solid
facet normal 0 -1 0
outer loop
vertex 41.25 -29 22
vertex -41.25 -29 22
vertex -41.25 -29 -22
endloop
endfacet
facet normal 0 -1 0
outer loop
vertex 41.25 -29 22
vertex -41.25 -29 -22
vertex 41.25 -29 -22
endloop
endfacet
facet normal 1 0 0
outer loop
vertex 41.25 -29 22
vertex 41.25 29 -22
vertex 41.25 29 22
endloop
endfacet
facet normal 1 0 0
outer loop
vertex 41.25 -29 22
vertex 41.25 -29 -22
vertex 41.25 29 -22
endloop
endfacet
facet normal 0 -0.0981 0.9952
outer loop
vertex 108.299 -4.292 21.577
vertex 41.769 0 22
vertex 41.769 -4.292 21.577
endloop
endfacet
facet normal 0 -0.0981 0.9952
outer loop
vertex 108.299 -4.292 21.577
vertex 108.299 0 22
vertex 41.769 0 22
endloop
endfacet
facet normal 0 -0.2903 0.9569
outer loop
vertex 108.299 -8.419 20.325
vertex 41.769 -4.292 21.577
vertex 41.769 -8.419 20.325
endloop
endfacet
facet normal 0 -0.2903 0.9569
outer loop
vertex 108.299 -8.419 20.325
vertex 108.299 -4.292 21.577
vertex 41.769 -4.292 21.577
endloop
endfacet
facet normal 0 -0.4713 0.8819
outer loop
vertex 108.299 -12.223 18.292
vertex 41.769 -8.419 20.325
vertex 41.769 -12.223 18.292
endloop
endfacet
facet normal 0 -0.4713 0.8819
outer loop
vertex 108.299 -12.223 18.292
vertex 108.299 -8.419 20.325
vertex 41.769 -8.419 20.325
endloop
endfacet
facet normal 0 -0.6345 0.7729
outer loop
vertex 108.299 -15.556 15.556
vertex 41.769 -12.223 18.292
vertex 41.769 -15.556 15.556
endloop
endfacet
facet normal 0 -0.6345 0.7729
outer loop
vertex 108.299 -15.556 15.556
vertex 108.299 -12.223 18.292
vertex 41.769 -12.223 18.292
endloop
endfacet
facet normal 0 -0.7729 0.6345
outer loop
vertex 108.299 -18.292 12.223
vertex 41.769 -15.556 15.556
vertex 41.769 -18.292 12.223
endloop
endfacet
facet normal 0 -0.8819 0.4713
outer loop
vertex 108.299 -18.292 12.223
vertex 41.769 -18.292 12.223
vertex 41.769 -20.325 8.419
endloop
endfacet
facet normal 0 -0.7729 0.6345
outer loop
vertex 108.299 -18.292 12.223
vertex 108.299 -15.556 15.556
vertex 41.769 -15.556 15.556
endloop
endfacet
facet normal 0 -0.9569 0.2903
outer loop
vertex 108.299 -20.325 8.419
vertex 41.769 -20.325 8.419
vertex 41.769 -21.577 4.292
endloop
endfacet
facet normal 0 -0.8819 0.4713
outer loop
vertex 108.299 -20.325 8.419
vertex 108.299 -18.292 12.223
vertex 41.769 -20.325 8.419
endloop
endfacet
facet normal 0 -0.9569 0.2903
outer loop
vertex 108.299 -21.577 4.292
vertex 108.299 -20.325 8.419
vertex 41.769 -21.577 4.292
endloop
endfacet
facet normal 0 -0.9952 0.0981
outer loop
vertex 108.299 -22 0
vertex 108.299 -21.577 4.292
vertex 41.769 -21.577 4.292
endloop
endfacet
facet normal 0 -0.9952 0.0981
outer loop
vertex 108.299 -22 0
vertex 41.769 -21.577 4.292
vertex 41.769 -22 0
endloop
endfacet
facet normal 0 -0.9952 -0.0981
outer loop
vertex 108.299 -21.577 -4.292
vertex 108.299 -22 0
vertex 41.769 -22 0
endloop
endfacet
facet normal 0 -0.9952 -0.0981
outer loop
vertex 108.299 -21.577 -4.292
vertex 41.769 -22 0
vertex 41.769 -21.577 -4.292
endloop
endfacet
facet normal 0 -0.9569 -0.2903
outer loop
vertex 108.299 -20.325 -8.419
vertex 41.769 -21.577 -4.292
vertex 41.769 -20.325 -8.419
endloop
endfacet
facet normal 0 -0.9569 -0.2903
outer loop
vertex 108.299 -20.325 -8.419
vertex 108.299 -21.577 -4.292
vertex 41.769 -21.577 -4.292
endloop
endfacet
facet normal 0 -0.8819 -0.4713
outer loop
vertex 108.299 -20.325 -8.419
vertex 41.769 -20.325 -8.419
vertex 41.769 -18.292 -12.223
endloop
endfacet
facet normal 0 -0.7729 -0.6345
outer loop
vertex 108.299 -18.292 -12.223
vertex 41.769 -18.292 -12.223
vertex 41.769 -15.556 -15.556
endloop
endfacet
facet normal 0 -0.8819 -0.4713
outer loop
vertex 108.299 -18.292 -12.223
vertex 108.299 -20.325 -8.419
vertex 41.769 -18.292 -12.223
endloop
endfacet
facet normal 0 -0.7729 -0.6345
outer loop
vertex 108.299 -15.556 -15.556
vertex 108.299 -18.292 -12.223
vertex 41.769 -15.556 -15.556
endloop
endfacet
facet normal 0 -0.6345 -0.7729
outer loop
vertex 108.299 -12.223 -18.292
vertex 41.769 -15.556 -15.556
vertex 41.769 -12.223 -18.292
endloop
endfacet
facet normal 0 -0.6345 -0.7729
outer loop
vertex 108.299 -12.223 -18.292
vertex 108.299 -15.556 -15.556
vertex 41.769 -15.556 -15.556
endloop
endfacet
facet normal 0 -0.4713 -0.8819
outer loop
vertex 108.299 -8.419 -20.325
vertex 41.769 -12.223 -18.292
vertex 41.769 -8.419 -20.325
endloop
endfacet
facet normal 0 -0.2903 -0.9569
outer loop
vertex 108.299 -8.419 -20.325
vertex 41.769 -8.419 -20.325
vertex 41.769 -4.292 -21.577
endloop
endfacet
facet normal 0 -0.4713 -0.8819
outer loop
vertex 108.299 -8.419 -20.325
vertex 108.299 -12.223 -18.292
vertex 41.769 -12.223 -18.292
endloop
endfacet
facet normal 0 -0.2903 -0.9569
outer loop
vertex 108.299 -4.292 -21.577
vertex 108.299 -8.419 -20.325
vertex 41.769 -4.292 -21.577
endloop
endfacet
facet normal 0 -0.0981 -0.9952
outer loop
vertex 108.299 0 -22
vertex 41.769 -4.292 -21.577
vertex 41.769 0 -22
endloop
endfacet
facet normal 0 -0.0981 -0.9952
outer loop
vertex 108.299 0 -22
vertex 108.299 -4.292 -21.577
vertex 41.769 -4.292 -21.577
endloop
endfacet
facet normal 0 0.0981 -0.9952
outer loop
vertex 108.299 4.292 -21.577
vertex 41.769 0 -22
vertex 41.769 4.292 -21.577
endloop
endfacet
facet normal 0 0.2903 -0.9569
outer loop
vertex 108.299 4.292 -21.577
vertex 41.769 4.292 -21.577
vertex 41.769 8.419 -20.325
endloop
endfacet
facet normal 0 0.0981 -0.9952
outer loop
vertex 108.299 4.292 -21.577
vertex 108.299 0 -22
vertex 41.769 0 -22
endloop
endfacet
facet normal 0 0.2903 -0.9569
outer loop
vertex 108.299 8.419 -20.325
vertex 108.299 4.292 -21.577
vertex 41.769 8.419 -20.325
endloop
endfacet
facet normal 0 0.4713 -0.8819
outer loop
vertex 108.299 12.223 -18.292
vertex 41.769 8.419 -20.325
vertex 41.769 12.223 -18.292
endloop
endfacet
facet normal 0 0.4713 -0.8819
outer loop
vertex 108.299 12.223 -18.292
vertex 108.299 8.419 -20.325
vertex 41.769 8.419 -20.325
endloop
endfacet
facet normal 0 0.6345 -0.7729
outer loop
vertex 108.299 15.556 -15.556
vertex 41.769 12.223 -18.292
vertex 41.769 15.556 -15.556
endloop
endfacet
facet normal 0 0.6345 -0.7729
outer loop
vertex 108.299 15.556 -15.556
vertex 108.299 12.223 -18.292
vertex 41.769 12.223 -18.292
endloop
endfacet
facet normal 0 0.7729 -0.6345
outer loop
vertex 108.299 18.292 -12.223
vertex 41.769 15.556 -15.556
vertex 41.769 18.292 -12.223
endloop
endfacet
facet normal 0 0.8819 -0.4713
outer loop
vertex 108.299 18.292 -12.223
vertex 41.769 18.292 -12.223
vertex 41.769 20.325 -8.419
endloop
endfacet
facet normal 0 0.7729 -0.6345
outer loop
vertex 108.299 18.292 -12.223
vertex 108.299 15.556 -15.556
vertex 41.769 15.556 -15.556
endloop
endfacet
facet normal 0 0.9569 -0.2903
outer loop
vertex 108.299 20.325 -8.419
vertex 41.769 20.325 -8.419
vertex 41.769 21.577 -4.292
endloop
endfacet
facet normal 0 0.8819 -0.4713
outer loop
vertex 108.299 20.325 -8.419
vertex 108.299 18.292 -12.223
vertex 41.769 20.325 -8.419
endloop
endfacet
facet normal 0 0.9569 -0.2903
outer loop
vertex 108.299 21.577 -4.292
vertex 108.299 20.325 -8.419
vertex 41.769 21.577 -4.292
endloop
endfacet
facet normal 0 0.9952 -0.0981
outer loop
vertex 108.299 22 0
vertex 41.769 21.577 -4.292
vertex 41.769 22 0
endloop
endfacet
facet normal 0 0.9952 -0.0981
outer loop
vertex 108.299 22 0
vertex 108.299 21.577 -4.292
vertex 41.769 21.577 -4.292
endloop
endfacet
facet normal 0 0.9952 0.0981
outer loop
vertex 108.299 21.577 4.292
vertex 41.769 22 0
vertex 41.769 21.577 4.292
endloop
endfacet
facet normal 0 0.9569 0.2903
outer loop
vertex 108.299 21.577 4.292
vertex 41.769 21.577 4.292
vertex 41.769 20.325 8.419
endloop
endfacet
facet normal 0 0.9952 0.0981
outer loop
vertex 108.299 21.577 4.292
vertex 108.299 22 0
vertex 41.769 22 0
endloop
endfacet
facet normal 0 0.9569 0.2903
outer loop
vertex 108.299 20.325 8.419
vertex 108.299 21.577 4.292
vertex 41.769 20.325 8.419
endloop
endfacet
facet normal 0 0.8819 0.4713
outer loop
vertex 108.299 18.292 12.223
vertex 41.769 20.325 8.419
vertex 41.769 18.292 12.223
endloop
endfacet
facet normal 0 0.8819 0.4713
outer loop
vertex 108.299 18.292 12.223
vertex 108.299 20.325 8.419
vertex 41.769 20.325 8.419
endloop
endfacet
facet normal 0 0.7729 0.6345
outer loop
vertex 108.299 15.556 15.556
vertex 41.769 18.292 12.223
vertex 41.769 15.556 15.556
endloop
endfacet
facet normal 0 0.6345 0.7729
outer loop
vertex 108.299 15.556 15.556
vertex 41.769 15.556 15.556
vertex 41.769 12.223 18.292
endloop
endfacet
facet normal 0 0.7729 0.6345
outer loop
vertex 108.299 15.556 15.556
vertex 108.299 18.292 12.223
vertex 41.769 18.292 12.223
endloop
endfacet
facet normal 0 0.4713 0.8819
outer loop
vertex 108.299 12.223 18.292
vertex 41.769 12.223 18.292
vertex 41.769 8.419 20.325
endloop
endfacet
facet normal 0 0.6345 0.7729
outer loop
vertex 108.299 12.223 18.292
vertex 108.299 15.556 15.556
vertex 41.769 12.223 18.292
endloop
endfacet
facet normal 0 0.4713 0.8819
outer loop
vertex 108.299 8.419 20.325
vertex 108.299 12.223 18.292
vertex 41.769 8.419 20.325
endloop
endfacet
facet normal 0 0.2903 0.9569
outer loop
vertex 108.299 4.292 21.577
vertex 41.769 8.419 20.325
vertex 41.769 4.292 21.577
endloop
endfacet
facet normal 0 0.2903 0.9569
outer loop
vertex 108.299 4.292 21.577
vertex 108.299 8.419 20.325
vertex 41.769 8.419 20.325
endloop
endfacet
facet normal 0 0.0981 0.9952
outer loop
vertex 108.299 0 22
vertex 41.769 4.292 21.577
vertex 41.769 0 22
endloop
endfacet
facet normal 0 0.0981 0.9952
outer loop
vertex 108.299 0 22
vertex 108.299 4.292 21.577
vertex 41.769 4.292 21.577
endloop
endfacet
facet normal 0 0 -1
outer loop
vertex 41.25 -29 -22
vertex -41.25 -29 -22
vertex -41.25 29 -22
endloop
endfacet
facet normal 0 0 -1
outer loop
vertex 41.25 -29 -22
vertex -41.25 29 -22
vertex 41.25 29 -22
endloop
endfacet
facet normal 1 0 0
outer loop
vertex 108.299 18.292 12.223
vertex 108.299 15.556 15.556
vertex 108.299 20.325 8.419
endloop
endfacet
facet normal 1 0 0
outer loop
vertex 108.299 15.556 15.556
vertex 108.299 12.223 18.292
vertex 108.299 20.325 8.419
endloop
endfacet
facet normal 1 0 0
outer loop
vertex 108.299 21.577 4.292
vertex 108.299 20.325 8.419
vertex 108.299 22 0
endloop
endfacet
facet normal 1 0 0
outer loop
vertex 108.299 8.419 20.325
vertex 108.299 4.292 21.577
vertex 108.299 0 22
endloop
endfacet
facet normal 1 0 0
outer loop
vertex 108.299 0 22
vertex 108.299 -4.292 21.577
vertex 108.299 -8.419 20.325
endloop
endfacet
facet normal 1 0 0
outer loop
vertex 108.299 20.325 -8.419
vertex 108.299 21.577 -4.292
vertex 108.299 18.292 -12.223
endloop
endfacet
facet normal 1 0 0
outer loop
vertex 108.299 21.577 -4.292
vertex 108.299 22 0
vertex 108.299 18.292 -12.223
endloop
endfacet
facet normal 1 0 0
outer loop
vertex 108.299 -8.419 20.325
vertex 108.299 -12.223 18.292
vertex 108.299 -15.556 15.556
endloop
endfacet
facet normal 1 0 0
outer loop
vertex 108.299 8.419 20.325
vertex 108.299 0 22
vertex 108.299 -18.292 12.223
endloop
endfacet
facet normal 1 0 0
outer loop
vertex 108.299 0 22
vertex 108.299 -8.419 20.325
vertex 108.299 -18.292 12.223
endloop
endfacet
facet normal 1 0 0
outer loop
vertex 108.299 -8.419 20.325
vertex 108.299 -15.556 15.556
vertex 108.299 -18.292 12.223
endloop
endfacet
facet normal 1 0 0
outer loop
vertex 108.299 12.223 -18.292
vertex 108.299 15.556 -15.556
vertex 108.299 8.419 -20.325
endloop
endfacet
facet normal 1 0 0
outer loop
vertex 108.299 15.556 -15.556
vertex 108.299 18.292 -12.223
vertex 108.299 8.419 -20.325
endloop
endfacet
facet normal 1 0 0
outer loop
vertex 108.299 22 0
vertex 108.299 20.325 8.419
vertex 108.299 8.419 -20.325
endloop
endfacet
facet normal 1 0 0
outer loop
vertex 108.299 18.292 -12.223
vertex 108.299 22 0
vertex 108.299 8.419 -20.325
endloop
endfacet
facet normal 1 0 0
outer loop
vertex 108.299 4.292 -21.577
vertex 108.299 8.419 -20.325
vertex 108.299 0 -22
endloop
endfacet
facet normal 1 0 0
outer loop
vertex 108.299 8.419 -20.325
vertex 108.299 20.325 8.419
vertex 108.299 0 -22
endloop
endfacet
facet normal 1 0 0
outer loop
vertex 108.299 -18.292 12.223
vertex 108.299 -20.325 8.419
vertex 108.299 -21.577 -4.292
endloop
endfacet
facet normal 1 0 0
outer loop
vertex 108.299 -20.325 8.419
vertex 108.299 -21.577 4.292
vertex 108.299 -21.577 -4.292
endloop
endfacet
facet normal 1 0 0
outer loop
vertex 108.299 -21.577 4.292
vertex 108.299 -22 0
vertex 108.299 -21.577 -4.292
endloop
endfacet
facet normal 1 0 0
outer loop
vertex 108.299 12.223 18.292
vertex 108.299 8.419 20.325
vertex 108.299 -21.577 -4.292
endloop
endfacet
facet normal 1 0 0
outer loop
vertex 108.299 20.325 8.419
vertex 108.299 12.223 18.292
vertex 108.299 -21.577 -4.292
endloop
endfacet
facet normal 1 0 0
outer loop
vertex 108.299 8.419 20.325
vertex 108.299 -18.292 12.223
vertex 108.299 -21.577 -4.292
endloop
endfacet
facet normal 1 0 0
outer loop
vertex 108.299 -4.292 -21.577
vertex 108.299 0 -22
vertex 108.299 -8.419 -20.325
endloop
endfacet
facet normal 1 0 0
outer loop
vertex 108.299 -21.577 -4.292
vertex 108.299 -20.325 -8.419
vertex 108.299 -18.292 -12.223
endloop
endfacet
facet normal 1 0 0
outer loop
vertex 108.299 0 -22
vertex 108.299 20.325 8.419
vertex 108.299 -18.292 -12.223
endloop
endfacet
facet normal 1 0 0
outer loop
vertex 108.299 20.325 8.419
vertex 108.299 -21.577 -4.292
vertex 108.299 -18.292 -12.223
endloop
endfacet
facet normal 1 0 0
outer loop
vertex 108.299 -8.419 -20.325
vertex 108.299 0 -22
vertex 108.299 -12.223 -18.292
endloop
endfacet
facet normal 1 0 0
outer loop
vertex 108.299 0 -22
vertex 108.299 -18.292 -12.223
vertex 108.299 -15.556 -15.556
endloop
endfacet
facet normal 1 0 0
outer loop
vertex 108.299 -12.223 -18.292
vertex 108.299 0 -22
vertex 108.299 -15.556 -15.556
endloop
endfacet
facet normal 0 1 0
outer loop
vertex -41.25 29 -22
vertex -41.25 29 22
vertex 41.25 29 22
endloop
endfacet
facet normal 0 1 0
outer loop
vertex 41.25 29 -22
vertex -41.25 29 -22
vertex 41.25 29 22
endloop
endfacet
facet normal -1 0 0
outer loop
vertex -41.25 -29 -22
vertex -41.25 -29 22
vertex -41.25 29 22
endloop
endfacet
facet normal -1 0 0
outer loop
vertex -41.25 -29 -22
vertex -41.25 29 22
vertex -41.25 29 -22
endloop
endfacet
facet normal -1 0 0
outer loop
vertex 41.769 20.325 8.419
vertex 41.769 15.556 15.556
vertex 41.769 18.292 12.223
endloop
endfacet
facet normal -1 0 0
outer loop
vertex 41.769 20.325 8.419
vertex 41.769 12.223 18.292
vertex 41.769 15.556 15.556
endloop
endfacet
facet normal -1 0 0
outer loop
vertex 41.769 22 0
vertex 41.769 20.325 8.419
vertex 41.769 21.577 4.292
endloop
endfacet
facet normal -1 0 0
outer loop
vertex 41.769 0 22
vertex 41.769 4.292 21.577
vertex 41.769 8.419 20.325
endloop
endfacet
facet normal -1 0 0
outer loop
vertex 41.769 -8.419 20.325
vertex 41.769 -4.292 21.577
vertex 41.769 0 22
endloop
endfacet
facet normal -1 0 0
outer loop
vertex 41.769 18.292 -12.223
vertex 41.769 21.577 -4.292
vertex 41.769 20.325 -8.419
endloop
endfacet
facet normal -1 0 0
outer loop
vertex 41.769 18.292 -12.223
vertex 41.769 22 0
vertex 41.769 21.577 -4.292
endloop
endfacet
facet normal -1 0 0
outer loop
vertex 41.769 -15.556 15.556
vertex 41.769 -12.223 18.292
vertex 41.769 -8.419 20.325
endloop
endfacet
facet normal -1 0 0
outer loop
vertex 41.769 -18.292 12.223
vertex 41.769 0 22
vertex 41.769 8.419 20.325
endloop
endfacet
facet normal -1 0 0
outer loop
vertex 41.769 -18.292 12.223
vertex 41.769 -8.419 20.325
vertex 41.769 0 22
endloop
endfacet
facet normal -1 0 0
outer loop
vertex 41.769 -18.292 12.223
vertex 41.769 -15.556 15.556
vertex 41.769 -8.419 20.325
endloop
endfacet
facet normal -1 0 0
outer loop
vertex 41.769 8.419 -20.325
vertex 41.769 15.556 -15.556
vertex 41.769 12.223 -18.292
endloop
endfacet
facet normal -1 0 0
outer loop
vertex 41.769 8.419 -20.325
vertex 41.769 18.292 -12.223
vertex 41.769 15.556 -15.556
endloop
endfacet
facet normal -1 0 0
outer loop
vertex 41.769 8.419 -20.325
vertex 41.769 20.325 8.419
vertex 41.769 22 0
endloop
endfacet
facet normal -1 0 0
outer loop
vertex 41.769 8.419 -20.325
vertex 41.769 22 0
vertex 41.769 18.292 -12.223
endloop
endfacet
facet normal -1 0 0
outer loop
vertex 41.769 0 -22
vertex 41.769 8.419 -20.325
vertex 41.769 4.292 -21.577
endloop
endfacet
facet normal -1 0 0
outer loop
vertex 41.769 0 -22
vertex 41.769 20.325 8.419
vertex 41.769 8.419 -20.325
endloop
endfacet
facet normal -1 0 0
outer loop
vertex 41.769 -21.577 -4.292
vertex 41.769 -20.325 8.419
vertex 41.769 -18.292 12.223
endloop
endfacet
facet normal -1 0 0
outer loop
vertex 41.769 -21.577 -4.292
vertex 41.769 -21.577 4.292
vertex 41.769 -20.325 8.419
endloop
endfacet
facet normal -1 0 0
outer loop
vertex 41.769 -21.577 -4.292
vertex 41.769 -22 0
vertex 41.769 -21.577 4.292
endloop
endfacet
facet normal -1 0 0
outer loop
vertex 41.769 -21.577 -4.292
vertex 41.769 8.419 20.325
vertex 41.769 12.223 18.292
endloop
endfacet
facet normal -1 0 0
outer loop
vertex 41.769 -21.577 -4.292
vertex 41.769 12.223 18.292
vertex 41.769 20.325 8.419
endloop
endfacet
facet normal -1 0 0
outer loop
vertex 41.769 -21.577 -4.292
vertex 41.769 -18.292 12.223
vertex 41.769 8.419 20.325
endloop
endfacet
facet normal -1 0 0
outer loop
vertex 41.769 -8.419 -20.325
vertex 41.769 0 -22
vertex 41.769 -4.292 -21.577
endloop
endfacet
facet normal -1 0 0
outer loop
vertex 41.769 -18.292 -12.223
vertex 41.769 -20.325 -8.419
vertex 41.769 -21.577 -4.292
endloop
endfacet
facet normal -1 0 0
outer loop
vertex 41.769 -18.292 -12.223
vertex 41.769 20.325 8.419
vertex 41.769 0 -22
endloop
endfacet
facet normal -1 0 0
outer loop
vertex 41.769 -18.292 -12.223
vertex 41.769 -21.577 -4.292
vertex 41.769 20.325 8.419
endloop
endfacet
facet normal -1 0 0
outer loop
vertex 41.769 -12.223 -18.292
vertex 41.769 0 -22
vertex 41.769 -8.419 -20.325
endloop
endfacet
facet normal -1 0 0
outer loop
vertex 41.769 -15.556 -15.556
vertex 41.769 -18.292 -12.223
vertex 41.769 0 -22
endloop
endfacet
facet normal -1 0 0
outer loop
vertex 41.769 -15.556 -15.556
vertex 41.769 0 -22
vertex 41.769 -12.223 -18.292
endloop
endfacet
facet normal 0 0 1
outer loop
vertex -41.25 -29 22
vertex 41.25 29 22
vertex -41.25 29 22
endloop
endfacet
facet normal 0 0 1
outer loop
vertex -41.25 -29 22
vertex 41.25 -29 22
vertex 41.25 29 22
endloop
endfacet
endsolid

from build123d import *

# Parameters (mm, degrees)
F1_W     = 66.53
F1_H     = 22
F3_DEPTH = 29


with BuildPart() as f2:
    # F1 (on Front) → F2 (revolve)
    with BuildSketch(Plane.XZ):
        with Locations((75.033943, 11)):
            Rectangle(F1_W, F1_H)
    revolve(axis=Axis((75.033943, 0, 0), (1, 0, 0)))


with BuildPart() as f3:
    # F0 (on Front) → F3 (new body, symmetric)
    with BuildSketch(Plane.XZ):
        Polygon((41.25, 0), (41.25, 22), (-41.25, 22), (-41.25, -22), (41.25, -22), align=None)
    extrude(amount=F3_DEPTH, both=True)


solid = Compound([f2.part, f3.part])
